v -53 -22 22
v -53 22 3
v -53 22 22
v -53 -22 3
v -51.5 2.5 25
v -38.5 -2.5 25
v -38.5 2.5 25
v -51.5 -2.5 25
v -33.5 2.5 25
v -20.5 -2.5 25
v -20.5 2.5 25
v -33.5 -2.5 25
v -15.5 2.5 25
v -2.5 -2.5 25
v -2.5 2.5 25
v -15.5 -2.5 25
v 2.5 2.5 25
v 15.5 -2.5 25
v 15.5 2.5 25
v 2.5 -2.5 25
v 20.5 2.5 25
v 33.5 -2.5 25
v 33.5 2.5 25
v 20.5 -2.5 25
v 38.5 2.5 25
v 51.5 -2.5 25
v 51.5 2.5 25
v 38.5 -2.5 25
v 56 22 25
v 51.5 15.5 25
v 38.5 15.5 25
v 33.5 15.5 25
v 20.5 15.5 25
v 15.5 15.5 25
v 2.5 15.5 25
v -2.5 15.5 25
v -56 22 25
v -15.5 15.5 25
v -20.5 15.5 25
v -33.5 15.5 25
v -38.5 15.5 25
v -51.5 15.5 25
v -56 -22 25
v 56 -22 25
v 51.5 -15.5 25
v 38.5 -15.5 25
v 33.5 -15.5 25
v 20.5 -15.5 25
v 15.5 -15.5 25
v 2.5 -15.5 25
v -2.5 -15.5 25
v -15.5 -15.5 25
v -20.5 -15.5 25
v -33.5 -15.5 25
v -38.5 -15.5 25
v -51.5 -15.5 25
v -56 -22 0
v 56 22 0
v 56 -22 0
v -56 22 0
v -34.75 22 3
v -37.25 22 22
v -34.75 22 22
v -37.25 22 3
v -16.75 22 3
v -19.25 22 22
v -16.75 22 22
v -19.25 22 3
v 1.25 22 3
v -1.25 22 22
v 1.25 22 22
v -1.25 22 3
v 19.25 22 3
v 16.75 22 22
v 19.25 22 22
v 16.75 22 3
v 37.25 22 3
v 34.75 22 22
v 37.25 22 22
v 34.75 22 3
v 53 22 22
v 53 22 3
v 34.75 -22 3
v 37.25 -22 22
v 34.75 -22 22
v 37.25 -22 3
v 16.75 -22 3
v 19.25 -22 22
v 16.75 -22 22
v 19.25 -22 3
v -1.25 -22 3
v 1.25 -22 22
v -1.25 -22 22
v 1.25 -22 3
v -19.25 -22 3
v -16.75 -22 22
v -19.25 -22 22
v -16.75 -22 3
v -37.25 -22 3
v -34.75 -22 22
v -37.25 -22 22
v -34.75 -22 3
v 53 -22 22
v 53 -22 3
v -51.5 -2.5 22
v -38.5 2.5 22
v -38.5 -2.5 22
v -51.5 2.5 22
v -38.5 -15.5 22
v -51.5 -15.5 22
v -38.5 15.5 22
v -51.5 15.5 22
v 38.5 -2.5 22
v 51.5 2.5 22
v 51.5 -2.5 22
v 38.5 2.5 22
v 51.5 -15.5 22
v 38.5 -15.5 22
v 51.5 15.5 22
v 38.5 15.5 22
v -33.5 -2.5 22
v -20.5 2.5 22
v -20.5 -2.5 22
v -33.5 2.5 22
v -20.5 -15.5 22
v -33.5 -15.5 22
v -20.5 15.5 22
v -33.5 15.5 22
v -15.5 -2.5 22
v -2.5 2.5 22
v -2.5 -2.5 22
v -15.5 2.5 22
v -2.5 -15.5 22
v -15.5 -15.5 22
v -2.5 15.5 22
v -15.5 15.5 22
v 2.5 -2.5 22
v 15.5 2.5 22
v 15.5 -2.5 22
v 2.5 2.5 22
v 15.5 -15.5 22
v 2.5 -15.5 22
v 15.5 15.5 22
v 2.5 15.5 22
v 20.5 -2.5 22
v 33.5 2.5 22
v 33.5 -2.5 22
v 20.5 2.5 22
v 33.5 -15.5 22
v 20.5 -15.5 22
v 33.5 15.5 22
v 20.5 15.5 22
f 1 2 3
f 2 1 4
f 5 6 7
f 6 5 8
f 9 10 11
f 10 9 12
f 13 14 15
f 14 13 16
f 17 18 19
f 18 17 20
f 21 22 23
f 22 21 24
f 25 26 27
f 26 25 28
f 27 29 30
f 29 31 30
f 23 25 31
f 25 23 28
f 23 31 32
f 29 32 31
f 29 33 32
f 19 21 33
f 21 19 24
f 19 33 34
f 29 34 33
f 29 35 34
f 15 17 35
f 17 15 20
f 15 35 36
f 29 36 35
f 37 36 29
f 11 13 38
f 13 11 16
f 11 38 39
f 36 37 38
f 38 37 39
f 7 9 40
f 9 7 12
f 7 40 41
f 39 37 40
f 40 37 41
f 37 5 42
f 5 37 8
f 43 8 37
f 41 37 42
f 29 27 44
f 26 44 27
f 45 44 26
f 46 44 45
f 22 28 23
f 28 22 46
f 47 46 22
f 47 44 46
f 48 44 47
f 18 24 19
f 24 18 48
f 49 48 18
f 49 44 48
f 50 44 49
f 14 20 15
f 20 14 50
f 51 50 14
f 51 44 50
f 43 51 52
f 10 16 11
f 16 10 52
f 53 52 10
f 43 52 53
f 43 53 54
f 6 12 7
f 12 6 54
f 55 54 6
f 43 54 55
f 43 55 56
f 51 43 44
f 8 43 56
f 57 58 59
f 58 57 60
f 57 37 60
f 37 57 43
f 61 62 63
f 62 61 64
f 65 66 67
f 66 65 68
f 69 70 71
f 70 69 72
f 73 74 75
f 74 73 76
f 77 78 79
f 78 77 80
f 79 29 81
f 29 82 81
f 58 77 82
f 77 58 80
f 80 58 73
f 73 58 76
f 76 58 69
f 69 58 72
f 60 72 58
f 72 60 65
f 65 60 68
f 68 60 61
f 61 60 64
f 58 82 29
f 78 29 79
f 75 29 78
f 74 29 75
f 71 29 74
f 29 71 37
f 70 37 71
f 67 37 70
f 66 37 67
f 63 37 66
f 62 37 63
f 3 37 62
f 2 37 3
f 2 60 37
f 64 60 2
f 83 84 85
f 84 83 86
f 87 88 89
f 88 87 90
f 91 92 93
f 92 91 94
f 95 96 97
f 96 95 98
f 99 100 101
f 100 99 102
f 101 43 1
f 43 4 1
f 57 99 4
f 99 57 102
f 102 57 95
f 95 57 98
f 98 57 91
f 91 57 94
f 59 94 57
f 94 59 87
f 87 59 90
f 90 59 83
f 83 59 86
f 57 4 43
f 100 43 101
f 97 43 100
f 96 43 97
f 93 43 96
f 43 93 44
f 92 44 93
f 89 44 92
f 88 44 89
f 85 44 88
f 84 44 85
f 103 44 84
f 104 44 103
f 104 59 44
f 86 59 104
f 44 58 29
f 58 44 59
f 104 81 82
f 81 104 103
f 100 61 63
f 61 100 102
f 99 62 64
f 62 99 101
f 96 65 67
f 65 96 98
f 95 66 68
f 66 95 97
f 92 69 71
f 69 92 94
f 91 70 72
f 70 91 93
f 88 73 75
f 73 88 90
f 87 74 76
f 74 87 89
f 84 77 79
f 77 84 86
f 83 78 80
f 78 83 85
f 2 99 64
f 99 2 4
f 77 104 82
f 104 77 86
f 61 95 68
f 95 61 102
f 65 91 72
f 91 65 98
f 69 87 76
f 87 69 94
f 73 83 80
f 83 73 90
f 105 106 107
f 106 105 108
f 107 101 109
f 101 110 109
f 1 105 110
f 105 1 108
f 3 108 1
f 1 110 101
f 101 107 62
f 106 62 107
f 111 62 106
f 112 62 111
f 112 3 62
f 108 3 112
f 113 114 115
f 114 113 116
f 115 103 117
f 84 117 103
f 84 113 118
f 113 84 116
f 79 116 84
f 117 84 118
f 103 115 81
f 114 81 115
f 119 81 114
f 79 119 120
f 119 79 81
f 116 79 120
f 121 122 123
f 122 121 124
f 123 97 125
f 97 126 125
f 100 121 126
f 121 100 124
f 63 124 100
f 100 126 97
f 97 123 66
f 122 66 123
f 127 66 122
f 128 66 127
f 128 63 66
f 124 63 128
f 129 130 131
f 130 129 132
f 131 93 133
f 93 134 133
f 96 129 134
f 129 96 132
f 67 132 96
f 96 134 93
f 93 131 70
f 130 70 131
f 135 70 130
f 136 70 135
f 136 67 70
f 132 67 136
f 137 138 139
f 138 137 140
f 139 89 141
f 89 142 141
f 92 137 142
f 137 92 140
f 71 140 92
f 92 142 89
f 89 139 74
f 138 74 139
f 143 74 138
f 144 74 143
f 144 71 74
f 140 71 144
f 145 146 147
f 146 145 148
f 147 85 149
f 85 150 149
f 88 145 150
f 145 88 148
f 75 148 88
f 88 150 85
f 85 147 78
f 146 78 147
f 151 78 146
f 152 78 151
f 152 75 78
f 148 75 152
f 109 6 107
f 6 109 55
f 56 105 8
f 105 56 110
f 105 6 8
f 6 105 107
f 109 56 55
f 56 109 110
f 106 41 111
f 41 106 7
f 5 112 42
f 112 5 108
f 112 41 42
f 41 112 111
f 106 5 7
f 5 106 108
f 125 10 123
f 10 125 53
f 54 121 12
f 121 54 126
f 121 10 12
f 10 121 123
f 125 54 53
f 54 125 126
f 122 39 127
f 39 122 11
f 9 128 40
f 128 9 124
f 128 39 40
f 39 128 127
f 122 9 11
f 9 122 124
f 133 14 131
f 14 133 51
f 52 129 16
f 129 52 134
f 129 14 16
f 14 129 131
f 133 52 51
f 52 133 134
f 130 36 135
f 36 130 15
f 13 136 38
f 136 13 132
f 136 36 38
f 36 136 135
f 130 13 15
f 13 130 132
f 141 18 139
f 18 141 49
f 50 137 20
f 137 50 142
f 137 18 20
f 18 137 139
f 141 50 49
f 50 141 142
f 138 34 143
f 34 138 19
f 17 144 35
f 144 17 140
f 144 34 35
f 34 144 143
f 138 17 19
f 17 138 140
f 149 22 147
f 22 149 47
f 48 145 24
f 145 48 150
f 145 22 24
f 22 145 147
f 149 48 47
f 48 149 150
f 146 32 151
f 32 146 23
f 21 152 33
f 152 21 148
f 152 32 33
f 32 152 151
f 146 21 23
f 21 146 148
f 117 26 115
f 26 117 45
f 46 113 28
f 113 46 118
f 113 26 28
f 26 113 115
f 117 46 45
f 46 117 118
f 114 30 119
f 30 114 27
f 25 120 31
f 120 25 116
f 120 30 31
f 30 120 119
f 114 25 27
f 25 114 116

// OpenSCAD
// Open-sided rack for 12 standard 12.5 mm square cuvettes
// Print orientation: standing on base plate, z = 0 at bed

$fn = 64;

// ---- Plates ----
plate_x      = 112;   // plate length (X)
plate_y      = 44;    // plate depth (Y)
plate_t      = 3;     // plate thickness
base_z0      = 0;     // base plate bottom
deck_z0      = 22;    // deck plate bottom
total_h      = 25;    // overall height (top of deck)

// ---- Walls ----
end_wall_t   = 3;     // end wall thickness (flush with short ends)
rib_t        = 2.5;   // internal rib thickness
rib_x        = [-36, -18, 0, 18, 36]; // rib centre positions

// ---- Cuvette holes ----
hole_size    = 13;    // square hole side
hole_pitch   = 18;    // centre-to-centre spacing (X and Y)
holes_nx     = 6;     // holes along X
holes_ny     = 2;     // rows along Y

eps          = 0.5;   // cutter overshoot

module rack() {
    difference() {
        union() {
            // Base plate
            translate([-plate_x/2, -plate_y/2, base_z0])
                cube([plate_x, plate_y, plate_t]);
            // Deck plate
            translate([-plate_x/2, -plate_y/2, deck_z0])
                cube([plate_x, plate_y, plate_t]);
            // End walls
            for (s = [-1, 1])
                translate([s > 0 ? plate_x/2 - end_wall_t : -plate_x/2, -plate_y/2, 0])
                    cube([end_wall_t, plate_y, total_h]);
            // Ribs
            for (x = rib_x)
                translate([x - rib_t/2, -plate_y/2, 0])
                    cube([rib_t, plate_y, total_h]);
        }
        // Square cuvette through-holes in deck
        for (i = [0 : holes_nx - 1])
            for (j = [0 : holes_ny - 1])
                translate([(i - (holes_nx - 1)/2) * hole_pitch - hole_size/2,
                           (j - (holes_ny - 1)/2) * hole_pitch - hole_size/2,
                           deck_z0 - eps])
                    cube([hole_size, hole_size, plate_t + 2*eps]);
    }
}

rack();
